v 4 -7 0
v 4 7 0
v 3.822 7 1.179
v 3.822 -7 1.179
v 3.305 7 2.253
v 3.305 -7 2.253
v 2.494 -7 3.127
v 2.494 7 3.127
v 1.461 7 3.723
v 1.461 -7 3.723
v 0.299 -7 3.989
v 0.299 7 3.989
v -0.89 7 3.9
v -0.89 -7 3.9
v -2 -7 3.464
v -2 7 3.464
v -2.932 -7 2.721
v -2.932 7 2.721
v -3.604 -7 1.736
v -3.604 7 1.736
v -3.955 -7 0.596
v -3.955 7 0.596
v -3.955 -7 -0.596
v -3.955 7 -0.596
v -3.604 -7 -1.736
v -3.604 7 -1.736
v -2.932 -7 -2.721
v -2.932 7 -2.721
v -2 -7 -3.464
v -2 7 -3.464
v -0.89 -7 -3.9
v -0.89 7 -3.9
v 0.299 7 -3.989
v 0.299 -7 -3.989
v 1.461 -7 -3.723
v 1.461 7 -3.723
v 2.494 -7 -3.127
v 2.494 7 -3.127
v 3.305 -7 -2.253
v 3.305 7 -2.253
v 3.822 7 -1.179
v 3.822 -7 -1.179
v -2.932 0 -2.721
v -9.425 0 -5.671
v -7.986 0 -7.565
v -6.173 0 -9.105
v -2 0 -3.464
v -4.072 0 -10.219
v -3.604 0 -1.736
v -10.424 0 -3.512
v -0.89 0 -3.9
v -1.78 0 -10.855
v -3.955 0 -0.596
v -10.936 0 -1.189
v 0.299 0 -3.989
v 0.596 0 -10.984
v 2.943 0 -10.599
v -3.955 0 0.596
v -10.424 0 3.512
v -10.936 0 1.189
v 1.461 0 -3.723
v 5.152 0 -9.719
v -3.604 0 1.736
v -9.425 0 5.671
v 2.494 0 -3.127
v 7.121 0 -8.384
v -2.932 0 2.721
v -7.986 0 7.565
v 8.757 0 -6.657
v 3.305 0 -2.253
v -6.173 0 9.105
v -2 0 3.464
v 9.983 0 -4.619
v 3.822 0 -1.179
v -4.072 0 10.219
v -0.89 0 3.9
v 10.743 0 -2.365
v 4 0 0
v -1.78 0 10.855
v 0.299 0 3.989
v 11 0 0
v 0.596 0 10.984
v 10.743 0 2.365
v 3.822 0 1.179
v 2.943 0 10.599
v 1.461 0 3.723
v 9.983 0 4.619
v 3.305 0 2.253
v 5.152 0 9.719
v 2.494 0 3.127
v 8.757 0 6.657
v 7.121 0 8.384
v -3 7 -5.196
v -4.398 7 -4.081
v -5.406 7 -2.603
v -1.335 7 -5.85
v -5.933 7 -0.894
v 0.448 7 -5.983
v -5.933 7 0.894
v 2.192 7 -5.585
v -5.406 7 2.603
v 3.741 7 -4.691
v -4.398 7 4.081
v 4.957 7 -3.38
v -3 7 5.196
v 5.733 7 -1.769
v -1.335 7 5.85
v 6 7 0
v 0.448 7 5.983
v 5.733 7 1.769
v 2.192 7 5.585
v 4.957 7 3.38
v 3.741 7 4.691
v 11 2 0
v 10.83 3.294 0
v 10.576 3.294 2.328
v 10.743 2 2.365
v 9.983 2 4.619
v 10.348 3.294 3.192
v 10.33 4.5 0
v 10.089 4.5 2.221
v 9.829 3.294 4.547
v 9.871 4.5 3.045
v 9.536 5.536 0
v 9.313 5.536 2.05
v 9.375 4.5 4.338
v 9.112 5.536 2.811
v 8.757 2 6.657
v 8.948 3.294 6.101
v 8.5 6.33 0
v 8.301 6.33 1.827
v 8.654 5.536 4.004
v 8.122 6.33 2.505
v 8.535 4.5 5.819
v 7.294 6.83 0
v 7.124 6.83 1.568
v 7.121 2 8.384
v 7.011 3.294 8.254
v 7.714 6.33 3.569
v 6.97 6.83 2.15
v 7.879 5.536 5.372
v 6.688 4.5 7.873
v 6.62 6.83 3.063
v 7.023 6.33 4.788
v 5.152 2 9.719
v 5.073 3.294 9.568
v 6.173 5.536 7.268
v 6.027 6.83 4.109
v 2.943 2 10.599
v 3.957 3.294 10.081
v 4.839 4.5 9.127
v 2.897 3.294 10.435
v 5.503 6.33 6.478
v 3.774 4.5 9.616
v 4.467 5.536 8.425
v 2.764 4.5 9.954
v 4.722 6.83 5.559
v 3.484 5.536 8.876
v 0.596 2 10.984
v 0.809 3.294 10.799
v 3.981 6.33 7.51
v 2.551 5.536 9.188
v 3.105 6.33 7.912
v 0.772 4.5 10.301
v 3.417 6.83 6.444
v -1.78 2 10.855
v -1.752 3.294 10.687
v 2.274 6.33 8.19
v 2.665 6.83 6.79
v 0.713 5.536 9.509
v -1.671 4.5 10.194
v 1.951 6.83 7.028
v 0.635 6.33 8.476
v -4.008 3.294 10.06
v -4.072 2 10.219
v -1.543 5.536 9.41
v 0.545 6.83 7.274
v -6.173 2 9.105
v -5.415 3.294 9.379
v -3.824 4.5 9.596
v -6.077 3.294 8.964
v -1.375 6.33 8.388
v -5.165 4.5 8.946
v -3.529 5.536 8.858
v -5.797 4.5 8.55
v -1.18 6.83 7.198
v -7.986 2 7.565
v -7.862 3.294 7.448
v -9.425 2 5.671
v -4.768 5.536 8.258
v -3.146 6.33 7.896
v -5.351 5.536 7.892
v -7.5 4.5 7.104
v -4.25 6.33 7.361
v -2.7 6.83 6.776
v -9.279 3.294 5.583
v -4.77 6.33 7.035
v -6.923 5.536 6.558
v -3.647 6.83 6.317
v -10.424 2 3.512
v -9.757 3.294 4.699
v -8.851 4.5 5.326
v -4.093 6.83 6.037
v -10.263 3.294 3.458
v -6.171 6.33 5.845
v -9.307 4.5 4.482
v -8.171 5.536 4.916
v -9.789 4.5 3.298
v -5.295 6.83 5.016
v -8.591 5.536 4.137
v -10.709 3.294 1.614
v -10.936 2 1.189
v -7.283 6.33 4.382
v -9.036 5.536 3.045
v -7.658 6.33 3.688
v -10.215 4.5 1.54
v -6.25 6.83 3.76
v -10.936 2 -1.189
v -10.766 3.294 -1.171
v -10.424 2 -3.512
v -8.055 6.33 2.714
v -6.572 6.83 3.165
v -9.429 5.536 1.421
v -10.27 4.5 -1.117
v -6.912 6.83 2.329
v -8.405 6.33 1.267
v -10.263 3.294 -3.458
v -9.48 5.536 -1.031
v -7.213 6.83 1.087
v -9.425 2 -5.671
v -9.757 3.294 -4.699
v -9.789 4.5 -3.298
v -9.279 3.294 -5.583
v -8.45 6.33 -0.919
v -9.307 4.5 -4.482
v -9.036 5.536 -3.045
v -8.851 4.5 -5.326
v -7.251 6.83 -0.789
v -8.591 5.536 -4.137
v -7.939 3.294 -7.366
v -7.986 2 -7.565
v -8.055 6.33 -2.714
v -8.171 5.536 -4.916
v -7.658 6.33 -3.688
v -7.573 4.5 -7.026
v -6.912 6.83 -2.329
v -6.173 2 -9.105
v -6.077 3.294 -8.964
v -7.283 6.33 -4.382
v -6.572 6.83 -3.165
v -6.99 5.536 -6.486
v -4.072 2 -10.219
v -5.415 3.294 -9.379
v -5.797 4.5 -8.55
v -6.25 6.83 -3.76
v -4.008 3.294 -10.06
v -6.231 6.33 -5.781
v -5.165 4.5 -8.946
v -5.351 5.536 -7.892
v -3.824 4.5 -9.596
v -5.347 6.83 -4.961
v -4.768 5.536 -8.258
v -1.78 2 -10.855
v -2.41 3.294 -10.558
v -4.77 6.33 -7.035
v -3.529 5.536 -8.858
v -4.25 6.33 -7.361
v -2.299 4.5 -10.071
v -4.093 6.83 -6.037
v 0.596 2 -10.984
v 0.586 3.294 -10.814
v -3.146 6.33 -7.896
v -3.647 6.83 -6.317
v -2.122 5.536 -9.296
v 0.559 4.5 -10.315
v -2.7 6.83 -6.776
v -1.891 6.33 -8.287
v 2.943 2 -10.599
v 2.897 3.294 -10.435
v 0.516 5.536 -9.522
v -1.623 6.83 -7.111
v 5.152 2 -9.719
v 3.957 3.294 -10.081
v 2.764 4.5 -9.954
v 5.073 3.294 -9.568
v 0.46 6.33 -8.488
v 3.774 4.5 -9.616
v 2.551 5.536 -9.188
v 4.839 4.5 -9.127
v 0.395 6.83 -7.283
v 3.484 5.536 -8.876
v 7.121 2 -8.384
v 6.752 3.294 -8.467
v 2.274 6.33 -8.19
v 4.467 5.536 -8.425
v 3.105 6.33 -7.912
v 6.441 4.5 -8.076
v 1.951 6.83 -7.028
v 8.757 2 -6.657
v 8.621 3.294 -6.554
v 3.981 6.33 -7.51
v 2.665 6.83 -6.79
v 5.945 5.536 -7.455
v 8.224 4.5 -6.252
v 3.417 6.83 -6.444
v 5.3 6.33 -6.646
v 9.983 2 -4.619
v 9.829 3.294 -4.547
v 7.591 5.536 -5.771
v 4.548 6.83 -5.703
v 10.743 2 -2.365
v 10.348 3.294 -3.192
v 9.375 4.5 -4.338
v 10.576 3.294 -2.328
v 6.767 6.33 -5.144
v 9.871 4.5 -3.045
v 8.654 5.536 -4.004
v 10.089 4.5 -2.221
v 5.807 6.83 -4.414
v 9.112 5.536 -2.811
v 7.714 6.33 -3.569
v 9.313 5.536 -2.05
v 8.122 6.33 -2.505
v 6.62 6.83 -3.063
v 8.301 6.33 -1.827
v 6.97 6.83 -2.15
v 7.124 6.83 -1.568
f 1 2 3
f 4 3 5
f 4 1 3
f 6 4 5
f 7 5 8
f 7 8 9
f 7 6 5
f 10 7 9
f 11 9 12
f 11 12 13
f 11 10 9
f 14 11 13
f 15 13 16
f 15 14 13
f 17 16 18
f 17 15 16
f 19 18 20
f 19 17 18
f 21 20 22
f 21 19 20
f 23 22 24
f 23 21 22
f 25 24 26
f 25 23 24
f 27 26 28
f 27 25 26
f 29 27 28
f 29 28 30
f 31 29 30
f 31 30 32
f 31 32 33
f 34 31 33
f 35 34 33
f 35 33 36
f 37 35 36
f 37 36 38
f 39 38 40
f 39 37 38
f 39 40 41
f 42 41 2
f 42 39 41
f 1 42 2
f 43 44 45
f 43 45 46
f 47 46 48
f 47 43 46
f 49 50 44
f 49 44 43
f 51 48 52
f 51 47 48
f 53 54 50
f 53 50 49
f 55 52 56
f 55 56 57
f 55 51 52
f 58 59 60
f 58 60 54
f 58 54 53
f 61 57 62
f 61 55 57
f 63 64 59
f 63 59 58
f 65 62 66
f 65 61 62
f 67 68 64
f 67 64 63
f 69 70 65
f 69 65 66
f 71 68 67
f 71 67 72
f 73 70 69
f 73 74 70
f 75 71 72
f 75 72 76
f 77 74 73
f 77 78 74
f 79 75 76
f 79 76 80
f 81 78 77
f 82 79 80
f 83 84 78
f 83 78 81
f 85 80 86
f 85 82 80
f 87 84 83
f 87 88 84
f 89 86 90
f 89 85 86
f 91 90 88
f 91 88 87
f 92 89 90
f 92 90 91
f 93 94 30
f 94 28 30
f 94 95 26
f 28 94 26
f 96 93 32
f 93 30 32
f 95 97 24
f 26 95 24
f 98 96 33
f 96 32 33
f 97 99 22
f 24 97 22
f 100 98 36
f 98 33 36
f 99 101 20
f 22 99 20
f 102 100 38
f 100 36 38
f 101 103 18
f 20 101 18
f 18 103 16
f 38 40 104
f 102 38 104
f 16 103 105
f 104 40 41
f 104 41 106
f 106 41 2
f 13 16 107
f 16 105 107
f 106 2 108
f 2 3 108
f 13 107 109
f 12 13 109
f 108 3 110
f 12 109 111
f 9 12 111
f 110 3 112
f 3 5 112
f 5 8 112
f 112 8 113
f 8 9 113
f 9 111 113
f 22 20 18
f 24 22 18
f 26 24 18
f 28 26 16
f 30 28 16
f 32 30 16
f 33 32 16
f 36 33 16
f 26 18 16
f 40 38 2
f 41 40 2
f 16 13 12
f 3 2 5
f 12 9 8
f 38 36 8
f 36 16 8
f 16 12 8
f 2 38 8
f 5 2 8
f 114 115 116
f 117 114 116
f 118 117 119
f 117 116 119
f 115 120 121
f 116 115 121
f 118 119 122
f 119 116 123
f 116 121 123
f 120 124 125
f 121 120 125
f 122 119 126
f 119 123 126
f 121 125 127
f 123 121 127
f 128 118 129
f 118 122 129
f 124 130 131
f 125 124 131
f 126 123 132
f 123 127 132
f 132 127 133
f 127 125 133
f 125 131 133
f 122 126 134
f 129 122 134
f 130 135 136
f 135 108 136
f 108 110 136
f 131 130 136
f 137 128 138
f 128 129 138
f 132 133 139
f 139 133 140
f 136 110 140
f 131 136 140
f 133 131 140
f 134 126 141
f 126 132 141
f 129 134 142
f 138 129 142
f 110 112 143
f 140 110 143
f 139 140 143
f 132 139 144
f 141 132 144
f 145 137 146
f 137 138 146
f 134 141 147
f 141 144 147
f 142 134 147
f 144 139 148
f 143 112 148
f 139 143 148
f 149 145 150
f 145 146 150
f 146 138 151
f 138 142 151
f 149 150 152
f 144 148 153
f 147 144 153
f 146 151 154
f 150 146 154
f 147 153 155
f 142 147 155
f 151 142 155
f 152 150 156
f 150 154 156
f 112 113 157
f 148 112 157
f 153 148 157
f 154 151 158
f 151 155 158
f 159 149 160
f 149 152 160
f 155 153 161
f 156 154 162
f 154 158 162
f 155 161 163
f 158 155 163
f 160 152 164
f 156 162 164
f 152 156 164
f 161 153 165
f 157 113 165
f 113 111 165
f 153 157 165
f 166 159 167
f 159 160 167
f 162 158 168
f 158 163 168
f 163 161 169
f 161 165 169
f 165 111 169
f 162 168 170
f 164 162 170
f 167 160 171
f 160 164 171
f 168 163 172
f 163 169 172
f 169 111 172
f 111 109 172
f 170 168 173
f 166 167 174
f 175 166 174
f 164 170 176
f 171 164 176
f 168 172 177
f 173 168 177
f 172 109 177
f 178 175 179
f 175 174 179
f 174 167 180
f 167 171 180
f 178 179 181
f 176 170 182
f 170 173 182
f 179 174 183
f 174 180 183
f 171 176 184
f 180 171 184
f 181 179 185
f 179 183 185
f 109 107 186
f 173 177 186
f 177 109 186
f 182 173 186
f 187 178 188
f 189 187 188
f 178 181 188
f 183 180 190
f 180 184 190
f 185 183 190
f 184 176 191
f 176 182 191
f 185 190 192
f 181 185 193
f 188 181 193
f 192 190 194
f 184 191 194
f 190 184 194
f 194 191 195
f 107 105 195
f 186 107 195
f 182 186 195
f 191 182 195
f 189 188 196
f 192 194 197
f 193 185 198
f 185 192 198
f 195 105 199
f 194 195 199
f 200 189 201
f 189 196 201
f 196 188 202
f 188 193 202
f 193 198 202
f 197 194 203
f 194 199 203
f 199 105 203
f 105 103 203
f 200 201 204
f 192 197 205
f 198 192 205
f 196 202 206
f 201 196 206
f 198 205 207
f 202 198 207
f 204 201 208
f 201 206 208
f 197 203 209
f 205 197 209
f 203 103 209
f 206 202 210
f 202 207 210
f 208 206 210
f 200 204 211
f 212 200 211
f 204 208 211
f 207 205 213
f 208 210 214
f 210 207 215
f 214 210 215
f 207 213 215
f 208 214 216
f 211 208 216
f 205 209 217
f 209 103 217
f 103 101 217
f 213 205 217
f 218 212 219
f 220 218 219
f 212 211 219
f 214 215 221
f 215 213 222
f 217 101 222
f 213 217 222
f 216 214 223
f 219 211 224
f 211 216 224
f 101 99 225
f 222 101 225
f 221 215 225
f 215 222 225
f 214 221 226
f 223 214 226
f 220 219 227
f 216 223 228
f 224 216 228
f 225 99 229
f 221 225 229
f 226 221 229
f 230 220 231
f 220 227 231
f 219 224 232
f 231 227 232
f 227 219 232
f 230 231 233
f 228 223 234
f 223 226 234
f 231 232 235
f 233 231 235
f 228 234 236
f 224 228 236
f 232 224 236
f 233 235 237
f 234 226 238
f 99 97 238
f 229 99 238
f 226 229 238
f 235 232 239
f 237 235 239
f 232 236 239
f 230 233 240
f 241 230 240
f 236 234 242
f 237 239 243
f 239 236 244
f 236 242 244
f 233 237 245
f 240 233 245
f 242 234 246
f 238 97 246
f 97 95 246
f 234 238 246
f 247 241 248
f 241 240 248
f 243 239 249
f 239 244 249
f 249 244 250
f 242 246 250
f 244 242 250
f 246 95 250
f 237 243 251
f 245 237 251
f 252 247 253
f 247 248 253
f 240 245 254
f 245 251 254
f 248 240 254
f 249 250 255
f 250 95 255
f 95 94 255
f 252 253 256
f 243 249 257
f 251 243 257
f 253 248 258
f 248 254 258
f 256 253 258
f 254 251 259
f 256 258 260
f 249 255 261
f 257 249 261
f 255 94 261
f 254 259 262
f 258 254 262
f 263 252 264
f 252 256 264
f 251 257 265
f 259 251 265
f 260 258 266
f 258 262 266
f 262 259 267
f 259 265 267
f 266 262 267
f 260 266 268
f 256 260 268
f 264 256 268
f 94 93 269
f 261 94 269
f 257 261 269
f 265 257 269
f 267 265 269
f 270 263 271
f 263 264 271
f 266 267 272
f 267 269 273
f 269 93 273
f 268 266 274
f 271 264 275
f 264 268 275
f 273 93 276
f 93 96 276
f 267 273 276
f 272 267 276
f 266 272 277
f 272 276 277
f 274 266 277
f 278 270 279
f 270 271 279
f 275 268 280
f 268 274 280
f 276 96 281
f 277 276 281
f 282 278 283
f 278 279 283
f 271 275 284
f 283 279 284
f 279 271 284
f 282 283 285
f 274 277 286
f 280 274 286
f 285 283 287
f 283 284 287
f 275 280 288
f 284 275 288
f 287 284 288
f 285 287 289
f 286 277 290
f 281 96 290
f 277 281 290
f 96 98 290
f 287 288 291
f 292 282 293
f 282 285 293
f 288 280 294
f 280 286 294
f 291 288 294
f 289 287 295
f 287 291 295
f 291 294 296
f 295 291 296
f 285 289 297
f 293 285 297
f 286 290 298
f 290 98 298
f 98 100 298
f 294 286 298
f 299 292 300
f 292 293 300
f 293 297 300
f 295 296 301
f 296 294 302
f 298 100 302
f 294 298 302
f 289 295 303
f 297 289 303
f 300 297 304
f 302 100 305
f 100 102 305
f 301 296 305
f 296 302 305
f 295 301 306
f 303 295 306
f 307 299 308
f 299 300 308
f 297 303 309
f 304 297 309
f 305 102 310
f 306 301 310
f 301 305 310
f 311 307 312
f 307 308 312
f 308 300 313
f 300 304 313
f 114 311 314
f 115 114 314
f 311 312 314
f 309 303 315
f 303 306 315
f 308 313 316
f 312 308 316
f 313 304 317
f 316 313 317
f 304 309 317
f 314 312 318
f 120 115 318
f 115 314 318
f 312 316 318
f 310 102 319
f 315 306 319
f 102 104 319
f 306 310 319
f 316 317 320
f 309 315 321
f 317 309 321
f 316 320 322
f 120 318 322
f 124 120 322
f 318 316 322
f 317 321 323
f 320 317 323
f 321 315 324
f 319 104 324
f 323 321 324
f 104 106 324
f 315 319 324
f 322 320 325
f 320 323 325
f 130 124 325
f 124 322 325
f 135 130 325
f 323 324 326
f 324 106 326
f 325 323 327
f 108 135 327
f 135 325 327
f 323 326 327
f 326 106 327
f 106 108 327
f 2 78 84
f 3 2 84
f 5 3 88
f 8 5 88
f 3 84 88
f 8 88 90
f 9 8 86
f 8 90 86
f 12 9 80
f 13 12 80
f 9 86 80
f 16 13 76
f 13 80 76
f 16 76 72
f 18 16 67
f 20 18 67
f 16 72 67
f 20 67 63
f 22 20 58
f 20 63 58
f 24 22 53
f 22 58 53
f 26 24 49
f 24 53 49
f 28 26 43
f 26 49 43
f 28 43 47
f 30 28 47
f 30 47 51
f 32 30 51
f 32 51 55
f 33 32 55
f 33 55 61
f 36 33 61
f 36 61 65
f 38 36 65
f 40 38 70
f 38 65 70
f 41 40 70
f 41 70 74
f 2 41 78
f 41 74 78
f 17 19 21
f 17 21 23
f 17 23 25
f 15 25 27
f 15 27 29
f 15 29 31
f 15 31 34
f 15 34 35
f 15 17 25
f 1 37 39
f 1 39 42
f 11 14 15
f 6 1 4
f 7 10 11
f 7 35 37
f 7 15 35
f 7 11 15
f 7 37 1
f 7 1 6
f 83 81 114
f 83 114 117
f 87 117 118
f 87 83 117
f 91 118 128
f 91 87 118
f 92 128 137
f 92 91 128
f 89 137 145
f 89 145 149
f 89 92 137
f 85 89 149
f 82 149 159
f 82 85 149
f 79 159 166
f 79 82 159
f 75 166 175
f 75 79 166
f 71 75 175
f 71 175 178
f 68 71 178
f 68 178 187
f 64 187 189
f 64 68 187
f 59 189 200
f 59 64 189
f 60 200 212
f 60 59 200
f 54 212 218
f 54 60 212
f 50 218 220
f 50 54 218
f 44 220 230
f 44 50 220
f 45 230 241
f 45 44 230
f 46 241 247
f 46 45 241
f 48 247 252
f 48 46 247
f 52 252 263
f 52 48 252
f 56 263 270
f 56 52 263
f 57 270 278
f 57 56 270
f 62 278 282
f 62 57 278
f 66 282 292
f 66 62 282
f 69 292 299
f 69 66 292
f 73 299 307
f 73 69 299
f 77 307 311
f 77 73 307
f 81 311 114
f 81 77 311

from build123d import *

# Parameters (mm, degrees)
F0_R     = 4
F1_DEPTH = 7
F0_R_2   = 11
F2_DEPTH = 7
F3_R     = 5


with BuildPart() as f1:
    # F0 (on Front) → F1 (new body, symmetric)
    with BuildSketch(Plane.XZ):
        Circle(F0_R)
    extrude(amount=F1_DEPTH, both=True)


with BuildPart() as f2:
    # F0 (on Front) → F2 (new body)
    with BuildSketch(Plane.XZ):
        Circle(F0_R_2)
        Circle(F0_R, mode=Mode.SUBTRACT)
    extrude(amount=-F2_DEPTH)

    # F3
    f3_edges = [f2.edges().sort_by_distance(p)[0] for p in [
        (-11, 7, 0),
    ]]
    fillet(f3_edges, radius=F3_R)


solid = Compound([f1.part, f2.part])
